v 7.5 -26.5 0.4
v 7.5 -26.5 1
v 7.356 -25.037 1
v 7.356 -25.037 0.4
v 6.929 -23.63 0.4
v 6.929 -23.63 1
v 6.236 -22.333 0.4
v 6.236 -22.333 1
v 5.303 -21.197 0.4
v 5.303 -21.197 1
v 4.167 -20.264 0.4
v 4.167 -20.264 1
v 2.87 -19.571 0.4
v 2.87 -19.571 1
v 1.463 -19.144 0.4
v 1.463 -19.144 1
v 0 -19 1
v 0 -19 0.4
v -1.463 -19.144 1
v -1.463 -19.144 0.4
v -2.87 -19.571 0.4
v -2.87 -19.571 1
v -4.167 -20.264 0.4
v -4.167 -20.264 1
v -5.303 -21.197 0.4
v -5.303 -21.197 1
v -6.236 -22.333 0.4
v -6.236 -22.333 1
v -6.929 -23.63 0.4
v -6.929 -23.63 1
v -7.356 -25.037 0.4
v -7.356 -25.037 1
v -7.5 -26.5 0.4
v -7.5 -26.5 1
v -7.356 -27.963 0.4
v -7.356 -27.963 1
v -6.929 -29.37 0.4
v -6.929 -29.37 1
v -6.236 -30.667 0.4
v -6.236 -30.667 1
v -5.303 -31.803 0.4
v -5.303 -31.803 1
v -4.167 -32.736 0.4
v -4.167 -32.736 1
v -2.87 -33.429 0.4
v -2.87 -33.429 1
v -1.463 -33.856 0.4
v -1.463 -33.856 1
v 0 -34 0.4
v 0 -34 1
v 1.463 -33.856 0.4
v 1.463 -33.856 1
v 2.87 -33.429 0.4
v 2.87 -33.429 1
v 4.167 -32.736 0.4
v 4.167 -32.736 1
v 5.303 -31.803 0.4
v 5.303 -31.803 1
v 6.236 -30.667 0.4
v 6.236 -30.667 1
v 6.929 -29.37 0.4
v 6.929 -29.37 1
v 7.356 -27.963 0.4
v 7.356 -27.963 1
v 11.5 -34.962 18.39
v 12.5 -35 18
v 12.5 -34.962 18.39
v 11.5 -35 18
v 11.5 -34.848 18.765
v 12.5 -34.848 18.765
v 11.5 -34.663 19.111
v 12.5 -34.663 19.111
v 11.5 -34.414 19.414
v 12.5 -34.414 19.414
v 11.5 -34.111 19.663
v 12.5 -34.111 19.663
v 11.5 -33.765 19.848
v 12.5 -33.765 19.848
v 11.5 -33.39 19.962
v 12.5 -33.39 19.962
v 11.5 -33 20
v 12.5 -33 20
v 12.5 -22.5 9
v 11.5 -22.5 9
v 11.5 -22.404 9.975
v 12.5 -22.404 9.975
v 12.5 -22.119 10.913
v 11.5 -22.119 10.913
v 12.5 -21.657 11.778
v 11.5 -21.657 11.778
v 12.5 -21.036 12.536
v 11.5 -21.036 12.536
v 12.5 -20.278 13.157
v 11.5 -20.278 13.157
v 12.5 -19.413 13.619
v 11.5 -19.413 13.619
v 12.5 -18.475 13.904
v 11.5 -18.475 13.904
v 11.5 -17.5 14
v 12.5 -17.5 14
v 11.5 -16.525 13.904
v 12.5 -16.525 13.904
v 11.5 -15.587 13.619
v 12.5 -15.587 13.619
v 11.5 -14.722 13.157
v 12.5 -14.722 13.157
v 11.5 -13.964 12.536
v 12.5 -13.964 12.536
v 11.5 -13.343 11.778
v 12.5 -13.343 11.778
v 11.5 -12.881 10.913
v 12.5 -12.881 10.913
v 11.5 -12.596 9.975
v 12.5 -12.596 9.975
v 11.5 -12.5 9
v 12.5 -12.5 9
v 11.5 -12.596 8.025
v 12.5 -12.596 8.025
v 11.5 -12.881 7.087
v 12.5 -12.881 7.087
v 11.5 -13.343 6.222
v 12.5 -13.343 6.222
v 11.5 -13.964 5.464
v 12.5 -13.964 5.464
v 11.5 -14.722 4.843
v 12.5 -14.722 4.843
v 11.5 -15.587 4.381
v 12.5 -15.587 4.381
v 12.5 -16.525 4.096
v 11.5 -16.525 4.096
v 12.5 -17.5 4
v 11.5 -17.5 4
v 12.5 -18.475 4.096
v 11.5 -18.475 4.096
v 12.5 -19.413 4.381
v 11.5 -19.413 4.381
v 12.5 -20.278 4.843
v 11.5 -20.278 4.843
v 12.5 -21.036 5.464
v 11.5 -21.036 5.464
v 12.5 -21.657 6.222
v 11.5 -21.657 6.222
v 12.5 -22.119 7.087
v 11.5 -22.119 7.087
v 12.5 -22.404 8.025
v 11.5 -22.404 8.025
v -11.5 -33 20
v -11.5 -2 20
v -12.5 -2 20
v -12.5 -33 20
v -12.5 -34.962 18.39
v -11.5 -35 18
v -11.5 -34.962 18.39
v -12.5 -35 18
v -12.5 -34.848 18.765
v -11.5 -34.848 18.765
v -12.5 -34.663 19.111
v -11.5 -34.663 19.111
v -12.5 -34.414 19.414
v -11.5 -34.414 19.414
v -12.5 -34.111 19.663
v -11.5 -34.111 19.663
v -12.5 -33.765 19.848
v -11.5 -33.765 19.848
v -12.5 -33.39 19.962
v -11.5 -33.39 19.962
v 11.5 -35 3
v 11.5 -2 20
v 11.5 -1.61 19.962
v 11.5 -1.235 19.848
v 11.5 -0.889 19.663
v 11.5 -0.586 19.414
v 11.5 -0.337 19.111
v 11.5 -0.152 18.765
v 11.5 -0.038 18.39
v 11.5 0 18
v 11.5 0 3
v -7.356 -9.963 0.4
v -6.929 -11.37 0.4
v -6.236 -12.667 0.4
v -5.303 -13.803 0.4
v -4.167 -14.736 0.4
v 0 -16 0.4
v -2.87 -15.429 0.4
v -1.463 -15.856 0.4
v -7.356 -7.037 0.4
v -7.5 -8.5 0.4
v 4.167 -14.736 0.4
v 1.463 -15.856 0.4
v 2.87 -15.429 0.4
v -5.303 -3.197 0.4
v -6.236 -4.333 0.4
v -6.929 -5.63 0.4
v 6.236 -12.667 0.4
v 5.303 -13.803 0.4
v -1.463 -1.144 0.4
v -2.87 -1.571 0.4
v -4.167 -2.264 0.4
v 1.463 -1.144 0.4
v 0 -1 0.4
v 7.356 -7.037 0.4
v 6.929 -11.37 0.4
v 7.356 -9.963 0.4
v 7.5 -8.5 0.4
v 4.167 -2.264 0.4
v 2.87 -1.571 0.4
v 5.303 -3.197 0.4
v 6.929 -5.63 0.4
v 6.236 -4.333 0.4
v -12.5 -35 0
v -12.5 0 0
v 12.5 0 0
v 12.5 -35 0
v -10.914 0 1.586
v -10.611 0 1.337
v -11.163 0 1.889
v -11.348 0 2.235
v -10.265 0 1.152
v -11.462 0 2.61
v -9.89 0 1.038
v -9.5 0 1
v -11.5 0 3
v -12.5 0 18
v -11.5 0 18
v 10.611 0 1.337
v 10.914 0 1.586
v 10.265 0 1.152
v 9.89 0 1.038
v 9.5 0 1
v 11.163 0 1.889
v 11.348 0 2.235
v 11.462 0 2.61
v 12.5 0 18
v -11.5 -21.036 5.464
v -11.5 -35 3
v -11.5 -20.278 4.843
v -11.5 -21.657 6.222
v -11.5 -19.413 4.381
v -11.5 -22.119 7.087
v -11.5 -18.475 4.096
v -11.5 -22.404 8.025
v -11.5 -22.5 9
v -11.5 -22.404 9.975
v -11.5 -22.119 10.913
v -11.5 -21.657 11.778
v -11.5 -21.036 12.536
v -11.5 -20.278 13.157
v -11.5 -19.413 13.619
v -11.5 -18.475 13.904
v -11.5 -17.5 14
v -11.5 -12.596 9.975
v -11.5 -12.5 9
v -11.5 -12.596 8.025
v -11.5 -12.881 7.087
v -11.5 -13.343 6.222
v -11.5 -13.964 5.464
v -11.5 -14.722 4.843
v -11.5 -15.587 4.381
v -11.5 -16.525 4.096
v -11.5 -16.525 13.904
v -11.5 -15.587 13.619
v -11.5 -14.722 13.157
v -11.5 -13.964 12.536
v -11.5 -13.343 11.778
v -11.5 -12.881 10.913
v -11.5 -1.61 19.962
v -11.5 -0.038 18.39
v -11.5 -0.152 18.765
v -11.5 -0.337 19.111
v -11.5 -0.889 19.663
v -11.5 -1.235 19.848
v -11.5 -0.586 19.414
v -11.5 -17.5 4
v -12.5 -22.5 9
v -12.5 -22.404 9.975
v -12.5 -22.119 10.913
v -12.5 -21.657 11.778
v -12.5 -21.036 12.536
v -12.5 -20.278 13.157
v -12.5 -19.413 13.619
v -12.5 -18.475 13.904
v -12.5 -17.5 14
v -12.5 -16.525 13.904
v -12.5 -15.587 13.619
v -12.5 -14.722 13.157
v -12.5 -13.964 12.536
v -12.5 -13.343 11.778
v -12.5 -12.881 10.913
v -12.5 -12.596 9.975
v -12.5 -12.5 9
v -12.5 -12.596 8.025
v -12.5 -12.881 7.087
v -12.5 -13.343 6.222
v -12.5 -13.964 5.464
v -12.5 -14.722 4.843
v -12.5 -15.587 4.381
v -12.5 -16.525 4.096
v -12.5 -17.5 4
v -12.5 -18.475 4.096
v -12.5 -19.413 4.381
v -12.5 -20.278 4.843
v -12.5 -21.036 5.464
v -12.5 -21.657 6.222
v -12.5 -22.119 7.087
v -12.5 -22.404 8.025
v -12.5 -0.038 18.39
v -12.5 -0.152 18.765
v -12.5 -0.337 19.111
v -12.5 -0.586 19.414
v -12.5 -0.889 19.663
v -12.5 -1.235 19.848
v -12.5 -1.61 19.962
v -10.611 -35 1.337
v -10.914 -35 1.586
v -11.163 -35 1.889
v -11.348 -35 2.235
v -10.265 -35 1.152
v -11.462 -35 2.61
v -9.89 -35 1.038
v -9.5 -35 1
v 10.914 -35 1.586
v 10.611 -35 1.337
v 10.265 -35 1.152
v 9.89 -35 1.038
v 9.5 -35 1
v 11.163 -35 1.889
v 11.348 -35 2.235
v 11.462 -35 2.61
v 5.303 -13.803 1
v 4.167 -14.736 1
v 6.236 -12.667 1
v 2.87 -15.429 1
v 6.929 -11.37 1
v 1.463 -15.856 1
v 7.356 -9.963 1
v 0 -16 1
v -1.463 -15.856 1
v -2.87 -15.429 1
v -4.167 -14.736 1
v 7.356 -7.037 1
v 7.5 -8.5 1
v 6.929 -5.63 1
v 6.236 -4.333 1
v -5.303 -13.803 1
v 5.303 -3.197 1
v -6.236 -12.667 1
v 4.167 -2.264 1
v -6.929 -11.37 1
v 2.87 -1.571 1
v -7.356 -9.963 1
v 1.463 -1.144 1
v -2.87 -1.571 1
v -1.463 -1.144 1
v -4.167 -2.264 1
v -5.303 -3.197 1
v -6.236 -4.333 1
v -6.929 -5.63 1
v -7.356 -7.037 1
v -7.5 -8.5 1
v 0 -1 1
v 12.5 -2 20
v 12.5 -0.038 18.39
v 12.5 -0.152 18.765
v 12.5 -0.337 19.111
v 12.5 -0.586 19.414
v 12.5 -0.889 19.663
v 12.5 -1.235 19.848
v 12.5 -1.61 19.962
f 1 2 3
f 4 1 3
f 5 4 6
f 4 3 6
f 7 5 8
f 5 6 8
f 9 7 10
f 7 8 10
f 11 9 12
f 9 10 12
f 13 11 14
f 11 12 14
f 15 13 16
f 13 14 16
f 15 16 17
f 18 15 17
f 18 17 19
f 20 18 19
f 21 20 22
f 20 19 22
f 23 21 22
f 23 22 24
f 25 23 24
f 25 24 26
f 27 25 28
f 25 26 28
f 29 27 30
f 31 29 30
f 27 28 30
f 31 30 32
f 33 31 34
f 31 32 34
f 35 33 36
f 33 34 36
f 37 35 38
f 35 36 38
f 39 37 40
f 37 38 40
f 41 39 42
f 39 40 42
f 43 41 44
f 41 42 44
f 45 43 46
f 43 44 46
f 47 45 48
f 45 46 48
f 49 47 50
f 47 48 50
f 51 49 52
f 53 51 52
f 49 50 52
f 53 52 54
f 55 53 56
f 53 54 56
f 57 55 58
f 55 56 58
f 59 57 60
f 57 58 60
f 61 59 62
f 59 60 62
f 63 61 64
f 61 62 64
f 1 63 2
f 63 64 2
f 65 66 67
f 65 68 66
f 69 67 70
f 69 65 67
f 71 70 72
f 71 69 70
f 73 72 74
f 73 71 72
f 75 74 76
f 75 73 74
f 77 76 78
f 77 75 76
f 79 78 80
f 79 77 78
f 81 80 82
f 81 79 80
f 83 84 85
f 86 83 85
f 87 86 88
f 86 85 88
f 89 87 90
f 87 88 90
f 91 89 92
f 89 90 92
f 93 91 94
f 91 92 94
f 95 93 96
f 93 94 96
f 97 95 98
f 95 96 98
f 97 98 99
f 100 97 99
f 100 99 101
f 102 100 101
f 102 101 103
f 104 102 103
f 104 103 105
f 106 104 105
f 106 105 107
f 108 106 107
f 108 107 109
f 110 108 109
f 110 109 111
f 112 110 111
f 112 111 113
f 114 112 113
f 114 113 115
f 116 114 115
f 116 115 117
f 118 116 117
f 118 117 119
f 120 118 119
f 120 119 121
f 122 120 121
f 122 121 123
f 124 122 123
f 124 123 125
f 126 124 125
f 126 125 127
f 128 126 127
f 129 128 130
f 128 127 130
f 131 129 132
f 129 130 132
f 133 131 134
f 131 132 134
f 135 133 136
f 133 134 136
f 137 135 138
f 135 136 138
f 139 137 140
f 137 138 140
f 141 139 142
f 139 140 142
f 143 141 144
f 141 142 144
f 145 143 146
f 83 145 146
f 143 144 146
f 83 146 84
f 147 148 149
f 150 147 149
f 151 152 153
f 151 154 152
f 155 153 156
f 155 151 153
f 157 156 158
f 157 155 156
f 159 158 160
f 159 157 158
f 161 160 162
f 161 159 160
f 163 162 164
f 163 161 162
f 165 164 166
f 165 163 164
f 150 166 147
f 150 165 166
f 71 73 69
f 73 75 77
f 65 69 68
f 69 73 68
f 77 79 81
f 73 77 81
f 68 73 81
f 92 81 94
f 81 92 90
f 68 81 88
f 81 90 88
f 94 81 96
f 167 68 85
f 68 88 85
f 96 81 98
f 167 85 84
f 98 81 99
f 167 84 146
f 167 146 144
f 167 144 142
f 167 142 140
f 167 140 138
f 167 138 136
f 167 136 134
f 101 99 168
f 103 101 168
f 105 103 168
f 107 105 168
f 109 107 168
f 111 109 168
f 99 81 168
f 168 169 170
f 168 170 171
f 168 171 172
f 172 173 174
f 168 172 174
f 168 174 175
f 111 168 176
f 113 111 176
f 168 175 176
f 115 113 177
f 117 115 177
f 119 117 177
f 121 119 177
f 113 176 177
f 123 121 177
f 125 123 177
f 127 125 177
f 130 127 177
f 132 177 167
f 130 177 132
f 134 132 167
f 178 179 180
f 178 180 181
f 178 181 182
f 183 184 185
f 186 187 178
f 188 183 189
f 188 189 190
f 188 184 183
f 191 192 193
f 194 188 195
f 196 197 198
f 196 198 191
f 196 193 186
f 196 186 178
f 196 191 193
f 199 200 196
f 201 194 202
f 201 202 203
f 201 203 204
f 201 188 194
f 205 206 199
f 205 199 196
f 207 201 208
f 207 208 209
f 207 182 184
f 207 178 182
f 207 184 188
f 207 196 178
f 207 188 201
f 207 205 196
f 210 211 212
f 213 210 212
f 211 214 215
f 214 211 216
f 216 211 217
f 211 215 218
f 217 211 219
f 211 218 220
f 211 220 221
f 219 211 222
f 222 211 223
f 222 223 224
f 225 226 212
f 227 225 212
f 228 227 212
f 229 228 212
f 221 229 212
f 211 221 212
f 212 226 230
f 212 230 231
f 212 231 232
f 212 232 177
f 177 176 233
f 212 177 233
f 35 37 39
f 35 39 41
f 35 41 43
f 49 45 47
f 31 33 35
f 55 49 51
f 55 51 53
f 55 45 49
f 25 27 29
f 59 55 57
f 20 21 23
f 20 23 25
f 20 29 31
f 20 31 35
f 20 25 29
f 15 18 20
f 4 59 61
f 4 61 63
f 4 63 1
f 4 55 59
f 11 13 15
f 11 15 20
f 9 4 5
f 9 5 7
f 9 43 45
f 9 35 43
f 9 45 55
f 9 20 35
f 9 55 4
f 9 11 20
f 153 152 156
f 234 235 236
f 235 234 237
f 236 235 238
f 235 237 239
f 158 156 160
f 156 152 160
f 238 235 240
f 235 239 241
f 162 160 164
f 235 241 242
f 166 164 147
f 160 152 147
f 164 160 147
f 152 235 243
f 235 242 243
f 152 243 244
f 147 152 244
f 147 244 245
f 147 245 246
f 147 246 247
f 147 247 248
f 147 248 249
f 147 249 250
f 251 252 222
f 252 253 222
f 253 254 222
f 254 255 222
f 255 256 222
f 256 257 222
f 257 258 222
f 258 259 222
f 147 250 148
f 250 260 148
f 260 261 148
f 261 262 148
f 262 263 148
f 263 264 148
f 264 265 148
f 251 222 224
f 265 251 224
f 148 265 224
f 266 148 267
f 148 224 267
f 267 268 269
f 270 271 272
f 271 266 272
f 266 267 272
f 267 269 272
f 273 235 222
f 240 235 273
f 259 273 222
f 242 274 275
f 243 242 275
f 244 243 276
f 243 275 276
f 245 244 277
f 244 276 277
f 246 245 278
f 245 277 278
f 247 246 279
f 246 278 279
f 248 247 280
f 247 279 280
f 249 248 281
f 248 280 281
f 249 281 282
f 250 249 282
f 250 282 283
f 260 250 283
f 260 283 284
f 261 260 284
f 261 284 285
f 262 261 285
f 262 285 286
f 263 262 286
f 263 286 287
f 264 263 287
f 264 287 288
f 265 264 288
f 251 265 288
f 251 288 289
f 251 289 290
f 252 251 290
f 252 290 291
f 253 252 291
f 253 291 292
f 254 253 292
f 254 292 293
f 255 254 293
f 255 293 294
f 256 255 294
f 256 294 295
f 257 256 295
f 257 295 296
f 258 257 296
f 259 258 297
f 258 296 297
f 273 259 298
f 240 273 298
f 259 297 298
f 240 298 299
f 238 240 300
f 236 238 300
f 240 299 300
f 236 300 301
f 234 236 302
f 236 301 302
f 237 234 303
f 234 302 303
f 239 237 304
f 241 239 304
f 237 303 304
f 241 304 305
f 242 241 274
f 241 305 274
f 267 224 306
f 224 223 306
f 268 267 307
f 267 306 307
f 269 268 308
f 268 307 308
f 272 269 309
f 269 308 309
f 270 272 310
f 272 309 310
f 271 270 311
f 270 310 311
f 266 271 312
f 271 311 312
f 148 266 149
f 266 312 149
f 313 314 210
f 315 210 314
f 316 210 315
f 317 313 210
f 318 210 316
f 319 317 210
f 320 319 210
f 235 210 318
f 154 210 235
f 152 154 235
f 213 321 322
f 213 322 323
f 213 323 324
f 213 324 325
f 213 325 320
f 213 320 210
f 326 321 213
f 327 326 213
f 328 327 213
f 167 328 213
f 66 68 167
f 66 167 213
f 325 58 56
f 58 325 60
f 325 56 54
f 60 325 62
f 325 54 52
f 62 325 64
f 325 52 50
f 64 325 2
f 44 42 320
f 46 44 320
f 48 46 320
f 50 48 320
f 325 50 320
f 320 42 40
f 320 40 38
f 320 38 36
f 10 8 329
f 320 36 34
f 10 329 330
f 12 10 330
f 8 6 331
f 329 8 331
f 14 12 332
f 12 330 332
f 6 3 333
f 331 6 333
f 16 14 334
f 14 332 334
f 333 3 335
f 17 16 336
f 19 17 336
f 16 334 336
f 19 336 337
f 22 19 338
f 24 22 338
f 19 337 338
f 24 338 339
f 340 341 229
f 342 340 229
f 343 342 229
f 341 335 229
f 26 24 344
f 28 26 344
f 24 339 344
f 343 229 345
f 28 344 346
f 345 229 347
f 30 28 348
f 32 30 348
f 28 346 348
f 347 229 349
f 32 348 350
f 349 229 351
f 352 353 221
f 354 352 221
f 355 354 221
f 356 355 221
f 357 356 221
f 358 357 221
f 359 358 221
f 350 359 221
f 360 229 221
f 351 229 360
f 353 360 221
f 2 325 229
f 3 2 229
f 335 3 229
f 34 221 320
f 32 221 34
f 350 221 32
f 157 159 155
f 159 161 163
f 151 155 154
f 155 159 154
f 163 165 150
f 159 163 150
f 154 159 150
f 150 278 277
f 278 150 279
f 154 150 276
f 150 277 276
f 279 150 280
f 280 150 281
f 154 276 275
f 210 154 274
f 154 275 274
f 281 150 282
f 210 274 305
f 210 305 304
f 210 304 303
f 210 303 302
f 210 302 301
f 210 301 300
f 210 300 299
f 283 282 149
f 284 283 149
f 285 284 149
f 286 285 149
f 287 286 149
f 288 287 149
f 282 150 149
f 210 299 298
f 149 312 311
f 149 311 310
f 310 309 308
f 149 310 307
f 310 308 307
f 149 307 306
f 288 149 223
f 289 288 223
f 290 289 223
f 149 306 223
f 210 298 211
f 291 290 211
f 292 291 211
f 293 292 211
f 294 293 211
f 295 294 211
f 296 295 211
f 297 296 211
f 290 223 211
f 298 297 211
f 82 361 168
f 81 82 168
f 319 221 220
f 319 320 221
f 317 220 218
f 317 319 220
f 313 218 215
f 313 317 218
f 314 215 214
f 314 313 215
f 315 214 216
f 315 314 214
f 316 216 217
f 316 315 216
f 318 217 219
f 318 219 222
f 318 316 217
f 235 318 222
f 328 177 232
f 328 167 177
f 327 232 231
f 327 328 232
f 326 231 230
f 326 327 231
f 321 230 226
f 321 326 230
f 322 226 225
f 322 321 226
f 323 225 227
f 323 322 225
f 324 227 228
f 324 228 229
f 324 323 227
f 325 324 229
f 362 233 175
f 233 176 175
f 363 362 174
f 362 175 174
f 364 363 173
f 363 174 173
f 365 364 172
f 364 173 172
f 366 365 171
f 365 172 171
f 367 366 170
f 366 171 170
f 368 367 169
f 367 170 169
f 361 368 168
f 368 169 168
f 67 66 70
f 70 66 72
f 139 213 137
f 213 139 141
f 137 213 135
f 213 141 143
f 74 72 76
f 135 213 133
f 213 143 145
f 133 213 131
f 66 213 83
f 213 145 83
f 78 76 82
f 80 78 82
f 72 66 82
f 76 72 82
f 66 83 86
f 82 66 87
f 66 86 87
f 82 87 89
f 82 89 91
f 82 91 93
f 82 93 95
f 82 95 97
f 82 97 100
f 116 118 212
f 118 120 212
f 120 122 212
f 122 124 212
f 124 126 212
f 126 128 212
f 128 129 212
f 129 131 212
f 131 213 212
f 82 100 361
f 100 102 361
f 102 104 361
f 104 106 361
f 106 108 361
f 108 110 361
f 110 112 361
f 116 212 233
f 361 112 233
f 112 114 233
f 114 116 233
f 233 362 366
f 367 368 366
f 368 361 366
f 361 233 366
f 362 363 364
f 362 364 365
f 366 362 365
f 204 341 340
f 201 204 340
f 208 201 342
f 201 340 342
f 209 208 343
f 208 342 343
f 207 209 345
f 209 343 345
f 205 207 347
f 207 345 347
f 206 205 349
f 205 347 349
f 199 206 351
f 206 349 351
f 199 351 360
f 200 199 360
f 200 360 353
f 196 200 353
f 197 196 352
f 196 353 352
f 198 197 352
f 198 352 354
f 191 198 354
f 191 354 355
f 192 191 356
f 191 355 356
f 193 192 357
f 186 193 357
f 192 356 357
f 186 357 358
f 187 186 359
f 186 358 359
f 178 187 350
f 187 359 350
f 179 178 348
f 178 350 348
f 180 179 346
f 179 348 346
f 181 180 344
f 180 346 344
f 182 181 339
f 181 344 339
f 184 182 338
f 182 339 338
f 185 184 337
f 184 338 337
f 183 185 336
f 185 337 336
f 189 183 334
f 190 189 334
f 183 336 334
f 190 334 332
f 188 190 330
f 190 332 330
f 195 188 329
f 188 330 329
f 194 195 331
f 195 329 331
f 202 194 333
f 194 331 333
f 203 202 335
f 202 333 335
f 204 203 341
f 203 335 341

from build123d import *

# Parameters (mm, degrees)
F1_DEPTH = 35
F2_R     = 7.5
F3_DEPTH = 0.6
F4_R     = 2
F5_R     = 5
F6_DEPTH = 25.001


with BuildPart() as f1:
    # F0 (on Front) → F1 (new body)
    with BuildSketch(Plane.XZ):
        Polygon((-12.5, 0), (0, 0), (12.5, 0), (12.5, 20), (11.5, 20), (11.5, 1), (0, 1), (-11.5, 1), (-11.5, 20), (-12.5, 20), align=None)
    extrude(amount=F1_DEPTH)

    # F2 (on face) → F3 (cut)
    with BuildSketch(Plane.XY.offset(1)):
        with Locations((0, -8.5)):
            Circle(F2_R)
        with Locations((0, -26.5)):
            Circle(F2_R)
    extrude(amount=-F3_DEPTH, mode=Mode.SUBTRACT)

    # F4
    f4_edges = [f1.edges().sort_by_distance(p)[0] for p in [
        (-11.5, -17.5, 1),
        (11.5, -17.5, 1),
        (-12, -35, 20),
        (12, -35, 20),
        (12, 0, 20),
        (-12, 0, 20),
    ]]
    fillet(f4_edges, radius=F4_R)

    # F5 (on face) → F6 (cut, through all)
    with BuildSketch(Plane(origin=(-12.5, 0, 0), x_dir=(0, -1, 0), z_dir=(-1, 0, 0))):
        with Locations((17.5, 9)):
            Circle(F5_R)
    extrude(amount=-F6_DEPTH, mode=Mode.SUBTRACT)


solid = f1.part
